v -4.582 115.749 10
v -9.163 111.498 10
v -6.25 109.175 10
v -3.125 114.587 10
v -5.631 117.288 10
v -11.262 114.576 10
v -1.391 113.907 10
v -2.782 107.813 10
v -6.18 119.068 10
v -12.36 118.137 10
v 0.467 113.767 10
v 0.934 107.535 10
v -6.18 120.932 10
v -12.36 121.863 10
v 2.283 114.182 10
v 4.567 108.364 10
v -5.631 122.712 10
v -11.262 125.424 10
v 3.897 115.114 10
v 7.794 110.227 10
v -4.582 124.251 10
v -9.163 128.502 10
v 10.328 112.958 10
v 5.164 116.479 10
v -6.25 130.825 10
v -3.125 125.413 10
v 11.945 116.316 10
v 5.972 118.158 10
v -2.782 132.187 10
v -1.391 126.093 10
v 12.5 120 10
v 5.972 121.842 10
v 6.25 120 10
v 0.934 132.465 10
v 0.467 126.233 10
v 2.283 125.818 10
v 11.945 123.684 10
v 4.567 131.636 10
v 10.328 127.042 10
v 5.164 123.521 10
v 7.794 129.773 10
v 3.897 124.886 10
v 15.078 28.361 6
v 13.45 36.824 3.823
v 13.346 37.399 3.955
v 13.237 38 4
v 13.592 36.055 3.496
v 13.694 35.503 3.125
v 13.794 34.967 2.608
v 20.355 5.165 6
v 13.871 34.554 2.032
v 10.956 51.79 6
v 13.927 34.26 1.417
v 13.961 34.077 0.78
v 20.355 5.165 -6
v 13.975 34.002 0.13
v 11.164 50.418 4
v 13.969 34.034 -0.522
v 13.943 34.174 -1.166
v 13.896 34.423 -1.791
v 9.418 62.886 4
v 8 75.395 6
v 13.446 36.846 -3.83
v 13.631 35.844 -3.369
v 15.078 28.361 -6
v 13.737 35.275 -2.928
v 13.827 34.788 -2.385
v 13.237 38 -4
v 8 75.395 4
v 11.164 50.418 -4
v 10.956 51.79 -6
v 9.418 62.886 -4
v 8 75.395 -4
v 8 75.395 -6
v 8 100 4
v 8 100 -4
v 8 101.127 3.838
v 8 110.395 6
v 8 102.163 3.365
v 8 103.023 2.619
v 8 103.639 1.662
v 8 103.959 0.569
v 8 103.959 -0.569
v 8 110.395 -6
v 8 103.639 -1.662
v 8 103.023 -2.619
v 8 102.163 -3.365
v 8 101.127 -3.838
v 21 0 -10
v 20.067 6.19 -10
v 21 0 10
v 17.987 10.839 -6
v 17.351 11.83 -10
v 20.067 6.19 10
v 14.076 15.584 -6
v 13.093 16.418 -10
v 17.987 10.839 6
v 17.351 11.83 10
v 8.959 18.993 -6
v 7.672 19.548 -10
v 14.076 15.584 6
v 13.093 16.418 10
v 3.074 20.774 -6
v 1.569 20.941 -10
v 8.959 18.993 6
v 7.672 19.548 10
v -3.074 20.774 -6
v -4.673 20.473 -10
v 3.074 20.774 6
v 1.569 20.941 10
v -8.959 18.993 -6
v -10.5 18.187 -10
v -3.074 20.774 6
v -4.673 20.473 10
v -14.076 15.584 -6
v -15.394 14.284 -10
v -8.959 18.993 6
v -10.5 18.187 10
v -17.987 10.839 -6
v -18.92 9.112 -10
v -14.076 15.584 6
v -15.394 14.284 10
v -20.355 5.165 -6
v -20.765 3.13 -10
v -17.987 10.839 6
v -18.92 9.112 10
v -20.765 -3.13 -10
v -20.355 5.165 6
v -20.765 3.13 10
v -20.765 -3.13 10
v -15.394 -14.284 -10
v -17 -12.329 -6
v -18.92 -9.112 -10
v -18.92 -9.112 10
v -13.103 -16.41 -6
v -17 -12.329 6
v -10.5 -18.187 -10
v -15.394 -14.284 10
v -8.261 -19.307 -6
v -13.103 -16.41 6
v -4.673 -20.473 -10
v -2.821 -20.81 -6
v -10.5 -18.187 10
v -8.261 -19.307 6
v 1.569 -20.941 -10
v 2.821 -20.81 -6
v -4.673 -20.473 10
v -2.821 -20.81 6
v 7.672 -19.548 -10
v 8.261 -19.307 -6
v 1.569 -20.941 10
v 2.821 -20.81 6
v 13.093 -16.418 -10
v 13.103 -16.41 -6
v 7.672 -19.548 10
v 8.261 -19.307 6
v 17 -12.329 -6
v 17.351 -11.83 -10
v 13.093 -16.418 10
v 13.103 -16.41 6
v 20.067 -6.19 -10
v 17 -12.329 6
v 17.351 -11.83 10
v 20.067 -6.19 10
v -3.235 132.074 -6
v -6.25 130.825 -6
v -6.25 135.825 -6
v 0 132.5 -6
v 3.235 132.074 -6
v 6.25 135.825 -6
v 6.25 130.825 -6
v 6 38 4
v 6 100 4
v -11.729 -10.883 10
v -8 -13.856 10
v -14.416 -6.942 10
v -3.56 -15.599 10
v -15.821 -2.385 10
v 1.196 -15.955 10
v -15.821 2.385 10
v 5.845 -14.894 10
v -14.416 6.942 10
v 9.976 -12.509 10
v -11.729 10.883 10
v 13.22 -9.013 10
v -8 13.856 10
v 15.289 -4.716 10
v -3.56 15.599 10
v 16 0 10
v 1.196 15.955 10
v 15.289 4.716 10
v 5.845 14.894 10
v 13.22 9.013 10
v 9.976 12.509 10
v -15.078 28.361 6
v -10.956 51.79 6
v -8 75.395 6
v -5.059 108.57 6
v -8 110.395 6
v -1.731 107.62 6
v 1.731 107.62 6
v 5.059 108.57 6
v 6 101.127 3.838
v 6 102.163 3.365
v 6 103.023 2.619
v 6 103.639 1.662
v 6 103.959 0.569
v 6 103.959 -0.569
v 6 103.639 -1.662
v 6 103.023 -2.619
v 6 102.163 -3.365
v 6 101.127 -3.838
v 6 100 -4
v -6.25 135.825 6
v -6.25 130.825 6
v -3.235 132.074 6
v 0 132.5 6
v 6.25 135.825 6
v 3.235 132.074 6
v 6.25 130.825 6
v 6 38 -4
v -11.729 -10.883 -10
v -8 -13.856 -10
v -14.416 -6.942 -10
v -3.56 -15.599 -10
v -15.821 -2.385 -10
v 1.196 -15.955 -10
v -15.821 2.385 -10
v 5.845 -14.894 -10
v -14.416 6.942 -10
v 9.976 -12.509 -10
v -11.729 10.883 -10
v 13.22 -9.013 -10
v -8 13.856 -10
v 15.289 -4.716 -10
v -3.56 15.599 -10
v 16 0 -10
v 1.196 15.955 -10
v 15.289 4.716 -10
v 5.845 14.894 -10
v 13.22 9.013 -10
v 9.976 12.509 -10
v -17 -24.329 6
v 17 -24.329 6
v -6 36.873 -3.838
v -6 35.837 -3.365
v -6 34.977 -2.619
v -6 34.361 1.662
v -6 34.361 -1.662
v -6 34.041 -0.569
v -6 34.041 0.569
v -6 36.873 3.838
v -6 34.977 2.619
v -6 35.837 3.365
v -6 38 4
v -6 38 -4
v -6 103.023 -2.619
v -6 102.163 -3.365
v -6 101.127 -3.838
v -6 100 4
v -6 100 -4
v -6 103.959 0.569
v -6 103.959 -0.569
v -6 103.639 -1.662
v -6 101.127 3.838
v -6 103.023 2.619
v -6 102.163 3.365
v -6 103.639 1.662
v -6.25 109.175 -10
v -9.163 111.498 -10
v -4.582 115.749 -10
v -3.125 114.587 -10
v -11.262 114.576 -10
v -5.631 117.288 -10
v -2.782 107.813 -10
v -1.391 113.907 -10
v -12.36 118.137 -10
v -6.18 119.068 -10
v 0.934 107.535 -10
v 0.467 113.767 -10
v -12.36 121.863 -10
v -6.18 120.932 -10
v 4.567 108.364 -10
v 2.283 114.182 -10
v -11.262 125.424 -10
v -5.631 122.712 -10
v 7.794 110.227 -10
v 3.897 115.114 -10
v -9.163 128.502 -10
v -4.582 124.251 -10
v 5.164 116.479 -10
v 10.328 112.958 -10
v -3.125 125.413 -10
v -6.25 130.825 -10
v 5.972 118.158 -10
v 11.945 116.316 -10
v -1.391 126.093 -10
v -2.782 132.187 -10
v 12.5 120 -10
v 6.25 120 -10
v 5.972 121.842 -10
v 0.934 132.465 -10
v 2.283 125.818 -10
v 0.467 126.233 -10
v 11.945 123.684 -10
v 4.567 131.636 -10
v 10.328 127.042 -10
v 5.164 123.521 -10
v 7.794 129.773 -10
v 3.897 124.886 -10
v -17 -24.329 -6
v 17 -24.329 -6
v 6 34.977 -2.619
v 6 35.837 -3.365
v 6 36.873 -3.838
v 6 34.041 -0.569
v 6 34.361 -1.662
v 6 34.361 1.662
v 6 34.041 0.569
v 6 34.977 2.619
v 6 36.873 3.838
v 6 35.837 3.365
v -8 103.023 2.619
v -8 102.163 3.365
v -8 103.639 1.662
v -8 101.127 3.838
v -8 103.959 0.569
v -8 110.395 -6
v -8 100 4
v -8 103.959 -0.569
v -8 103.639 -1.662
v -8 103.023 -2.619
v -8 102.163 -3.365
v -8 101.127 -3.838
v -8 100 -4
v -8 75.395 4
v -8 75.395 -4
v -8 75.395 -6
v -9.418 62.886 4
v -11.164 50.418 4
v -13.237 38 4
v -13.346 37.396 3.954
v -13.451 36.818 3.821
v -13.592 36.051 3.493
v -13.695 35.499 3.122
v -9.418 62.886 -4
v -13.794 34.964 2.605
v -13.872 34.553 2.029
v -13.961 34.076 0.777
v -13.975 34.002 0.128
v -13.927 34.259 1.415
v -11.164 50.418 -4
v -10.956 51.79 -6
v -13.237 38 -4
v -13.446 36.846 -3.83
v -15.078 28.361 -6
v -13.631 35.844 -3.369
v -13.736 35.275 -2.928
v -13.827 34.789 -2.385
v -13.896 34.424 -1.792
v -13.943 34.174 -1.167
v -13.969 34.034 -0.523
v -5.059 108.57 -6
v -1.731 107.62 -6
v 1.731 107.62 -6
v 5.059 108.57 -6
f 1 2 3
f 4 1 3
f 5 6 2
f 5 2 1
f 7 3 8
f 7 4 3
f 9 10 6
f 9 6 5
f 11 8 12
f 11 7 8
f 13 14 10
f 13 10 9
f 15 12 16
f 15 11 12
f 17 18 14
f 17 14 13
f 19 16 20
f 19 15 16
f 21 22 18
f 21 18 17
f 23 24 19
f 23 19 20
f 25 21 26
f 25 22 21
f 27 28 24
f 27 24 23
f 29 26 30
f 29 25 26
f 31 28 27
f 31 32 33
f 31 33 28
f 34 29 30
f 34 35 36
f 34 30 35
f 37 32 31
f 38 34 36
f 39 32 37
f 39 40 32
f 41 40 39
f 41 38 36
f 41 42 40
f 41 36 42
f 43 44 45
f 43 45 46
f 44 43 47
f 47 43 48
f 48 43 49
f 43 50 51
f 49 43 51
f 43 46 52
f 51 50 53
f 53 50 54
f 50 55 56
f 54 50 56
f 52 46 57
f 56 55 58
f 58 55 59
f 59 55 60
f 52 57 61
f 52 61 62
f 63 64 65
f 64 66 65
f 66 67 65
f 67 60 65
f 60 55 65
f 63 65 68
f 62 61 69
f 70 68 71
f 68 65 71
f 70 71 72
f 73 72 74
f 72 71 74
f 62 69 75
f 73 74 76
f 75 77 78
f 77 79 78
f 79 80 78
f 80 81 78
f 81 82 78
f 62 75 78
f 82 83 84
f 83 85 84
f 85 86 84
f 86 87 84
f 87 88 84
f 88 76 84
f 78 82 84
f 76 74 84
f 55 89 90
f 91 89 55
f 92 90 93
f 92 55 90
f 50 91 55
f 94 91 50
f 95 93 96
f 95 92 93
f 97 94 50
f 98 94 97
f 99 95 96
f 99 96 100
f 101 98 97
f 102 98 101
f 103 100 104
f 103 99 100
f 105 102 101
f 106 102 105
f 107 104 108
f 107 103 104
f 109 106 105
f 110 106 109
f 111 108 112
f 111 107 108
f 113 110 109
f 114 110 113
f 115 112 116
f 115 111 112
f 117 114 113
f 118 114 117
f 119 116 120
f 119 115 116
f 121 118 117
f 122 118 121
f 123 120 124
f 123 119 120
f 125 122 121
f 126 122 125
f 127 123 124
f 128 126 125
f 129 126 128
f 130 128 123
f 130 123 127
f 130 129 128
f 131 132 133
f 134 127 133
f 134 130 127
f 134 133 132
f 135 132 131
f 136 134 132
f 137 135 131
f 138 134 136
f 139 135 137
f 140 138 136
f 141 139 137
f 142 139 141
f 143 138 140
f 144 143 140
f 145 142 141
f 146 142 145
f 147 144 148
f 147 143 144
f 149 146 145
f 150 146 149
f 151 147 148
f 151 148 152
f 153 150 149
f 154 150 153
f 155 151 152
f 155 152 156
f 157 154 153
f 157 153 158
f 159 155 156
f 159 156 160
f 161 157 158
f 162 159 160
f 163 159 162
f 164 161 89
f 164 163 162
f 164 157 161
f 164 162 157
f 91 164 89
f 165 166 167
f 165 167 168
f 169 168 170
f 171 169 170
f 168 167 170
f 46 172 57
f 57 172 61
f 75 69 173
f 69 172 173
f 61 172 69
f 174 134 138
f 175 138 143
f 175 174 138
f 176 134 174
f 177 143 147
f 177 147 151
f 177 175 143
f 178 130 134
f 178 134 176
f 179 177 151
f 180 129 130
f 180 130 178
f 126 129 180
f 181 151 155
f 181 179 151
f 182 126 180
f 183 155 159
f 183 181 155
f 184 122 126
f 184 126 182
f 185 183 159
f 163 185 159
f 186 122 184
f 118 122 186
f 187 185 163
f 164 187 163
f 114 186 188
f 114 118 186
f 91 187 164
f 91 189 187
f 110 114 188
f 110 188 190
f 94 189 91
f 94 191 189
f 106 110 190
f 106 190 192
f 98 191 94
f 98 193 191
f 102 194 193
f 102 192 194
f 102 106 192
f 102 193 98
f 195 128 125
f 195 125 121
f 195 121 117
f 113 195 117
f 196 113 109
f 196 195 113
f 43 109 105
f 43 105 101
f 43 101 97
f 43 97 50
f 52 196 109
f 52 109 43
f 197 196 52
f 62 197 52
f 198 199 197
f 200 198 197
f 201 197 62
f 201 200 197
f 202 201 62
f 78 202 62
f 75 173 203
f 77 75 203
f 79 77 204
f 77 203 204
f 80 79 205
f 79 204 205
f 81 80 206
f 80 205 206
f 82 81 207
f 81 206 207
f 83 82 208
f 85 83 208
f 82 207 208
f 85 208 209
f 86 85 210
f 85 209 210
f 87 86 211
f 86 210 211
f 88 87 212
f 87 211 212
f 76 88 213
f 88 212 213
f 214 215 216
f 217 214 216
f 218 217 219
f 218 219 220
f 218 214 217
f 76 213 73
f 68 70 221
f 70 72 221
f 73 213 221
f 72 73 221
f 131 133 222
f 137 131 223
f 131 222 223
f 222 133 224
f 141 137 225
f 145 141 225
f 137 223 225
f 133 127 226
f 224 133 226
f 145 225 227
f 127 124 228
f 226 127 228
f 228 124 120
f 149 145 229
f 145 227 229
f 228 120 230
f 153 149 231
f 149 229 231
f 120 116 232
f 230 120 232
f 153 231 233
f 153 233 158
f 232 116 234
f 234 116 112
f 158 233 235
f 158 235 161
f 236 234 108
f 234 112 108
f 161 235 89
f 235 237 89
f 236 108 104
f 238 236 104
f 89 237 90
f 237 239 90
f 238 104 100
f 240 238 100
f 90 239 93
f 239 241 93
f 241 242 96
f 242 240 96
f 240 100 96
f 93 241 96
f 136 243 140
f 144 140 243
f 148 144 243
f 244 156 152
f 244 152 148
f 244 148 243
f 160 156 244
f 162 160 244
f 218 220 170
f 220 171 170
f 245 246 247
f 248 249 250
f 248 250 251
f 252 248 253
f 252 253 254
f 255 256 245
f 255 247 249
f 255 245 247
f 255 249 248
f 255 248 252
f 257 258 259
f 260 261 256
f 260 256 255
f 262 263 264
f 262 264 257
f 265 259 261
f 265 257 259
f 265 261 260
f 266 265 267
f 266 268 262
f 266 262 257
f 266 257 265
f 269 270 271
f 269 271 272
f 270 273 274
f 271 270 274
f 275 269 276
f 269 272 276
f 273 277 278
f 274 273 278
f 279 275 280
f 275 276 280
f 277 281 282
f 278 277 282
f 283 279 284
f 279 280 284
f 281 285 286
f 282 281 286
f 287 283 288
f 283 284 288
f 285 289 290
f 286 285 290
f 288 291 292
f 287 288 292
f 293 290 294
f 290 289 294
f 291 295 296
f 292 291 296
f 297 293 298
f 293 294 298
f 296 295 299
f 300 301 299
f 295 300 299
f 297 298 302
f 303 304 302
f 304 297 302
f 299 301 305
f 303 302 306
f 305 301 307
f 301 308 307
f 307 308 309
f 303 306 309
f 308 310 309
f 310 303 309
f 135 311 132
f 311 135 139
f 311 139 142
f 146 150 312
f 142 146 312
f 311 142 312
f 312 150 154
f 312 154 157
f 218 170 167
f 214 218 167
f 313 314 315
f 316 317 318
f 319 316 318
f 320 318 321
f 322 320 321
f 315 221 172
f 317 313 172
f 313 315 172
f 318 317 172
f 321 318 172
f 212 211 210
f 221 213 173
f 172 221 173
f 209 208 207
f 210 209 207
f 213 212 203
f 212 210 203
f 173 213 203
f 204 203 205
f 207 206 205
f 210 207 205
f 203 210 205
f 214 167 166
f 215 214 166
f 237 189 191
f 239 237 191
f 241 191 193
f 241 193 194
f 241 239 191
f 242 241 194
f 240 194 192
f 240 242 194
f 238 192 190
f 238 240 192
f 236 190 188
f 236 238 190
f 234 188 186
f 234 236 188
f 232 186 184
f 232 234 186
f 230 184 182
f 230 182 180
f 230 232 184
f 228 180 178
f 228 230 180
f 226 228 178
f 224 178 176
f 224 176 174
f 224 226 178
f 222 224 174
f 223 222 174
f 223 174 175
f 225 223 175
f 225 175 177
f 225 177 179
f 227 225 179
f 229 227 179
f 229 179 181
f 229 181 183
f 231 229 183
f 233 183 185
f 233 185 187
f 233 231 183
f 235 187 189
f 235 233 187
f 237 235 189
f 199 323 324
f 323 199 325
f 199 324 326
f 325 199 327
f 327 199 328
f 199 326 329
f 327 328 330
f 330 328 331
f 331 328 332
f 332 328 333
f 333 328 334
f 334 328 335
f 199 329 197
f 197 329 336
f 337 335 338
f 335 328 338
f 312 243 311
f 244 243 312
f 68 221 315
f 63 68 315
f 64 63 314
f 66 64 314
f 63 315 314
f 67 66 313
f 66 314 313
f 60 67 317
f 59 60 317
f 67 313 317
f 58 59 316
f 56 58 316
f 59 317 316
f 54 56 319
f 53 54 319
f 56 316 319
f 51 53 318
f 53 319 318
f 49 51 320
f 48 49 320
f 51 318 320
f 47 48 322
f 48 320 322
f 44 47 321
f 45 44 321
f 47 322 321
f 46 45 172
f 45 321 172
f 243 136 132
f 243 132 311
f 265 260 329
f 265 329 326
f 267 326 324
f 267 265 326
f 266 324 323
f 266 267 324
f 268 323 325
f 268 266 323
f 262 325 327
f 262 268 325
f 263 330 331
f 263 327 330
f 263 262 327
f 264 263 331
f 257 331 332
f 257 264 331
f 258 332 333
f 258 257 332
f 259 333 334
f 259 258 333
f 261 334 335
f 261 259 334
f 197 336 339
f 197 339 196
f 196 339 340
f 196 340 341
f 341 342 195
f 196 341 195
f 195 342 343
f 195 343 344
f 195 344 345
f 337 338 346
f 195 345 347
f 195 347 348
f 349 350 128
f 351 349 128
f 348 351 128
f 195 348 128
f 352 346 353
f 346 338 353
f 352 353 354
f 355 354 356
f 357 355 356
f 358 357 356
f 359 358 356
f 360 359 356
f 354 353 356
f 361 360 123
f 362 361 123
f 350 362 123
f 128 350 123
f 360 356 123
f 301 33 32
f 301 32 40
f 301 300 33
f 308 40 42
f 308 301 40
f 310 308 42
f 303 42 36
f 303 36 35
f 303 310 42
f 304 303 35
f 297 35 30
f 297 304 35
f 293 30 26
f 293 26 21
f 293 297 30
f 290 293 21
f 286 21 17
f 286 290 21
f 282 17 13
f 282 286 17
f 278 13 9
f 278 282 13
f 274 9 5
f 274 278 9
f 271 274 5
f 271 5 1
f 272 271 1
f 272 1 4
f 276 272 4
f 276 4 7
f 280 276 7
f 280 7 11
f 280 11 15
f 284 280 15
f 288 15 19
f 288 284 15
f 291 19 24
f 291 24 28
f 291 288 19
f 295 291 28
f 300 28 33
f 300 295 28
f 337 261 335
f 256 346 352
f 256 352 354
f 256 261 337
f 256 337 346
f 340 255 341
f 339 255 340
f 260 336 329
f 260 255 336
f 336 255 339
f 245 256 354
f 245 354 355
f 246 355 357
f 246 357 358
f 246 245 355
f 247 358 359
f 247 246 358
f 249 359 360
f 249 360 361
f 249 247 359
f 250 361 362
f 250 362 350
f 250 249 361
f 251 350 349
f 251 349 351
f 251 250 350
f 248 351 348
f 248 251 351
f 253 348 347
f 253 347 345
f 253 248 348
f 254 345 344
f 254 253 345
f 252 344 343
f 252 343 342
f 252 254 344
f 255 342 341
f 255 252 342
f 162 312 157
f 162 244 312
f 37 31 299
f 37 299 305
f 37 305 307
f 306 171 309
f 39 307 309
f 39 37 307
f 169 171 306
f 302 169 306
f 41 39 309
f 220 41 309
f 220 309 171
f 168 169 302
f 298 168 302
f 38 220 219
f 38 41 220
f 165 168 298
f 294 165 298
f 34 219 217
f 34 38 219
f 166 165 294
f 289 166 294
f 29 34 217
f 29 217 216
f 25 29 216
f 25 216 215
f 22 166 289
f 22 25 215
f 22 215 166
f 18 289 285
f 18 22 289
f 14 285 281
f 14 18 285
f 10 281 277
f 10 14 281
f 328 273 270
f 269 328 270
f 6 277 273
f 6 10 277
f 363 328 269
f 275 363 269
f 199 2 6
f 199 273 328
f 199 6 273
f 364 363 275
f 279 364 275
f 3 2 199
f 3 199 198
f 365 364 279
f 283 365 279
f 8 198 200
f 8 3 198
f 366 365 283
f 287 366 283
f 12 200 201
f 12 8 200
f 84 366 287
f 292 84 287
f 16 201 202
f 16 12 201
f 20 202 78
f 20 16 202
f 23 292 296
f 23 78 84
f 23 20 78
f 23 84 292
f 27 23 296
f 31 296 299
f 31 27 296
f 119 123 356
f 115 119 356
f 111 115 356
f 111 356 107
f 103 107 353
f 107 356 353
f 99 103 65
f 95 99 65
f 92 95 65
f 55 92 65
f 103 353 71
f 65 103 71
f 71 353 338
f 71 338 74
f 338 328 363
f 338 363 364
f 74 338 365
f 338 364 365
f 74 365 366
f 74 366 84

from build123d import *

# Parameters (mm, degrees)
SKETCH2_R             = 12.5
SKETCH2_R_2           = 6.25
BOSS_EXTRUDE1_DEPTH   = 10
SKETCH2_R_3           = 21
SKETCH2_R_4           = 16
BOSS_EXTRUDE1_2_DEPTH = 10
BOSS_EXTRUDE2_DEPTH   = 6
CUT_EXTRUDE1_START    = -6
CUT_EXTRUDE1_DEPTH    = 132.802456026
CUT_EXTRUDE4_START    = 6
CUT_EXTRUDE4_DEPTH    = 132.802456026


with BuildPart() as part:
    # Sketch2 → Boss-Extrude1 (new, symmetric)
    with BuildSketch(Plane.XY):
        with Locations((0, 120)):
            Circle(SKETCH2_R)
        with Locations((0, 120)):
            Circle(SKETCH2_R_2, mode=Mode.SUBTRACT)
    extrude(amount=BOSS_EXTRUDE1_DEPTH, both=True)



with BuildPart() as body_2:
    # Sketch2 → Boss-Extrude1 2 (new, symmetric)
    with BuildSketch(Plane.XY):
        Circle(SKETCH2_R_3)
        Circle(SKETCH2_R_4, mode=Mode.SUBTRACT)
    extrude(amount=BOSS_EXTRUDE1_2_DEPTH, both=True)


with BuildPart() as part_1:
    add(part.part)

    add(body_2.part)  # Boss-Extrude2 merges body 2
    # Sketch2<3> → Boss-Extrude2 (add, symmetric)
    with BuildSketch(Plane.XY):
        with BuildLine():
            ThreePointArc((8, 110.395313644), (0, 107.5), (-8, 110.395313644))
            Line((-8, 110.395313644), (-8, 75.395313644))
            ThreePointArc((-8, 75.395313644), (-12.871500282, 40.050257874), (-20.354994984, 5.164705142))
            ThreePointArc((-20.354994984, 5.164705142), (0, 21), (20.354994984, 5.164705142))
            ThreePointArc((20.354994984, 5.164705142), (12.871500282, 40.050257874), (8, 75.395313644))
            Line((8, 75.395313644), (8, 110.395313644))
        make_face()
        with BuildLine():
            Line((-6.25, 135.825317547), (-6.25, 130.825317547))
            ThreePointArc((-6.25, 130.825317547), (0, 132.5), (6.25, 130.825317547))
            Line((6.25, 130.825317547), (6.25, 135.825317547))
            Line((6.25, 135.825317547), (-6.25, 135.825317547))
        make_face()
        with BuildLine():
            ThreePointArc((17, -12.328828006), (0, -21), (-17, -12.328828006))
            Line((-17, -12.328828006), (-17, -24.328828006))
            Line((-17, -24.328828006), (17, -24.328828006))
            Line((17, -24.328828006), (17, -12.328828006))
        make_face()
    extrude(amount=BOSS_EXTRUDE2_DEPTH, both=True)

    # Sketch4 → Cut-Extrude1 (cut, through all)
    with BuildSketch(Plane(origin=(0, 0, 0), x_dir=(0, 0, -1), z_dir=(1, 0, 0)).offset(CUT_EXTRUDE1_START)):
        with BuildLine():
            Line((4, 100), (4, 38))
            ThreePointArc((4, 38), (0, 34), (-4, 38))
            Line((-4, 38), (-4, 100))
            ThreePointArc((-4, 100), (0, 104), (4, 100))
        make_face()
    extrude(amount=-CUT_EXTRUDE1_DEPTH, mode=Mode.SUBTRACT)

    # Sketch4<4> → Cut-Extrude4 (cut, through all)
    with BuildSketch(Plane(origin=(0, 0, 0), x_dir=(0, 0, -1), z_dir=(1, 0, 0)).offset(CUT_EXTRUDE4_START)):
        with BuildLine():
            Line((4, 100), (4, 38))
            ThreePointArc((4, 38), (0, 34), (-4, 38))
            Line((-4, 38), (-4, 100))
            ThreePointArc((-4, 100), (0, 104), (4, 100))
        make_face()
    extrude(amount=CUT_EXTRUDE4_DEPTH, mode=Mode.SUBTRACT)


solid = part_1.part
